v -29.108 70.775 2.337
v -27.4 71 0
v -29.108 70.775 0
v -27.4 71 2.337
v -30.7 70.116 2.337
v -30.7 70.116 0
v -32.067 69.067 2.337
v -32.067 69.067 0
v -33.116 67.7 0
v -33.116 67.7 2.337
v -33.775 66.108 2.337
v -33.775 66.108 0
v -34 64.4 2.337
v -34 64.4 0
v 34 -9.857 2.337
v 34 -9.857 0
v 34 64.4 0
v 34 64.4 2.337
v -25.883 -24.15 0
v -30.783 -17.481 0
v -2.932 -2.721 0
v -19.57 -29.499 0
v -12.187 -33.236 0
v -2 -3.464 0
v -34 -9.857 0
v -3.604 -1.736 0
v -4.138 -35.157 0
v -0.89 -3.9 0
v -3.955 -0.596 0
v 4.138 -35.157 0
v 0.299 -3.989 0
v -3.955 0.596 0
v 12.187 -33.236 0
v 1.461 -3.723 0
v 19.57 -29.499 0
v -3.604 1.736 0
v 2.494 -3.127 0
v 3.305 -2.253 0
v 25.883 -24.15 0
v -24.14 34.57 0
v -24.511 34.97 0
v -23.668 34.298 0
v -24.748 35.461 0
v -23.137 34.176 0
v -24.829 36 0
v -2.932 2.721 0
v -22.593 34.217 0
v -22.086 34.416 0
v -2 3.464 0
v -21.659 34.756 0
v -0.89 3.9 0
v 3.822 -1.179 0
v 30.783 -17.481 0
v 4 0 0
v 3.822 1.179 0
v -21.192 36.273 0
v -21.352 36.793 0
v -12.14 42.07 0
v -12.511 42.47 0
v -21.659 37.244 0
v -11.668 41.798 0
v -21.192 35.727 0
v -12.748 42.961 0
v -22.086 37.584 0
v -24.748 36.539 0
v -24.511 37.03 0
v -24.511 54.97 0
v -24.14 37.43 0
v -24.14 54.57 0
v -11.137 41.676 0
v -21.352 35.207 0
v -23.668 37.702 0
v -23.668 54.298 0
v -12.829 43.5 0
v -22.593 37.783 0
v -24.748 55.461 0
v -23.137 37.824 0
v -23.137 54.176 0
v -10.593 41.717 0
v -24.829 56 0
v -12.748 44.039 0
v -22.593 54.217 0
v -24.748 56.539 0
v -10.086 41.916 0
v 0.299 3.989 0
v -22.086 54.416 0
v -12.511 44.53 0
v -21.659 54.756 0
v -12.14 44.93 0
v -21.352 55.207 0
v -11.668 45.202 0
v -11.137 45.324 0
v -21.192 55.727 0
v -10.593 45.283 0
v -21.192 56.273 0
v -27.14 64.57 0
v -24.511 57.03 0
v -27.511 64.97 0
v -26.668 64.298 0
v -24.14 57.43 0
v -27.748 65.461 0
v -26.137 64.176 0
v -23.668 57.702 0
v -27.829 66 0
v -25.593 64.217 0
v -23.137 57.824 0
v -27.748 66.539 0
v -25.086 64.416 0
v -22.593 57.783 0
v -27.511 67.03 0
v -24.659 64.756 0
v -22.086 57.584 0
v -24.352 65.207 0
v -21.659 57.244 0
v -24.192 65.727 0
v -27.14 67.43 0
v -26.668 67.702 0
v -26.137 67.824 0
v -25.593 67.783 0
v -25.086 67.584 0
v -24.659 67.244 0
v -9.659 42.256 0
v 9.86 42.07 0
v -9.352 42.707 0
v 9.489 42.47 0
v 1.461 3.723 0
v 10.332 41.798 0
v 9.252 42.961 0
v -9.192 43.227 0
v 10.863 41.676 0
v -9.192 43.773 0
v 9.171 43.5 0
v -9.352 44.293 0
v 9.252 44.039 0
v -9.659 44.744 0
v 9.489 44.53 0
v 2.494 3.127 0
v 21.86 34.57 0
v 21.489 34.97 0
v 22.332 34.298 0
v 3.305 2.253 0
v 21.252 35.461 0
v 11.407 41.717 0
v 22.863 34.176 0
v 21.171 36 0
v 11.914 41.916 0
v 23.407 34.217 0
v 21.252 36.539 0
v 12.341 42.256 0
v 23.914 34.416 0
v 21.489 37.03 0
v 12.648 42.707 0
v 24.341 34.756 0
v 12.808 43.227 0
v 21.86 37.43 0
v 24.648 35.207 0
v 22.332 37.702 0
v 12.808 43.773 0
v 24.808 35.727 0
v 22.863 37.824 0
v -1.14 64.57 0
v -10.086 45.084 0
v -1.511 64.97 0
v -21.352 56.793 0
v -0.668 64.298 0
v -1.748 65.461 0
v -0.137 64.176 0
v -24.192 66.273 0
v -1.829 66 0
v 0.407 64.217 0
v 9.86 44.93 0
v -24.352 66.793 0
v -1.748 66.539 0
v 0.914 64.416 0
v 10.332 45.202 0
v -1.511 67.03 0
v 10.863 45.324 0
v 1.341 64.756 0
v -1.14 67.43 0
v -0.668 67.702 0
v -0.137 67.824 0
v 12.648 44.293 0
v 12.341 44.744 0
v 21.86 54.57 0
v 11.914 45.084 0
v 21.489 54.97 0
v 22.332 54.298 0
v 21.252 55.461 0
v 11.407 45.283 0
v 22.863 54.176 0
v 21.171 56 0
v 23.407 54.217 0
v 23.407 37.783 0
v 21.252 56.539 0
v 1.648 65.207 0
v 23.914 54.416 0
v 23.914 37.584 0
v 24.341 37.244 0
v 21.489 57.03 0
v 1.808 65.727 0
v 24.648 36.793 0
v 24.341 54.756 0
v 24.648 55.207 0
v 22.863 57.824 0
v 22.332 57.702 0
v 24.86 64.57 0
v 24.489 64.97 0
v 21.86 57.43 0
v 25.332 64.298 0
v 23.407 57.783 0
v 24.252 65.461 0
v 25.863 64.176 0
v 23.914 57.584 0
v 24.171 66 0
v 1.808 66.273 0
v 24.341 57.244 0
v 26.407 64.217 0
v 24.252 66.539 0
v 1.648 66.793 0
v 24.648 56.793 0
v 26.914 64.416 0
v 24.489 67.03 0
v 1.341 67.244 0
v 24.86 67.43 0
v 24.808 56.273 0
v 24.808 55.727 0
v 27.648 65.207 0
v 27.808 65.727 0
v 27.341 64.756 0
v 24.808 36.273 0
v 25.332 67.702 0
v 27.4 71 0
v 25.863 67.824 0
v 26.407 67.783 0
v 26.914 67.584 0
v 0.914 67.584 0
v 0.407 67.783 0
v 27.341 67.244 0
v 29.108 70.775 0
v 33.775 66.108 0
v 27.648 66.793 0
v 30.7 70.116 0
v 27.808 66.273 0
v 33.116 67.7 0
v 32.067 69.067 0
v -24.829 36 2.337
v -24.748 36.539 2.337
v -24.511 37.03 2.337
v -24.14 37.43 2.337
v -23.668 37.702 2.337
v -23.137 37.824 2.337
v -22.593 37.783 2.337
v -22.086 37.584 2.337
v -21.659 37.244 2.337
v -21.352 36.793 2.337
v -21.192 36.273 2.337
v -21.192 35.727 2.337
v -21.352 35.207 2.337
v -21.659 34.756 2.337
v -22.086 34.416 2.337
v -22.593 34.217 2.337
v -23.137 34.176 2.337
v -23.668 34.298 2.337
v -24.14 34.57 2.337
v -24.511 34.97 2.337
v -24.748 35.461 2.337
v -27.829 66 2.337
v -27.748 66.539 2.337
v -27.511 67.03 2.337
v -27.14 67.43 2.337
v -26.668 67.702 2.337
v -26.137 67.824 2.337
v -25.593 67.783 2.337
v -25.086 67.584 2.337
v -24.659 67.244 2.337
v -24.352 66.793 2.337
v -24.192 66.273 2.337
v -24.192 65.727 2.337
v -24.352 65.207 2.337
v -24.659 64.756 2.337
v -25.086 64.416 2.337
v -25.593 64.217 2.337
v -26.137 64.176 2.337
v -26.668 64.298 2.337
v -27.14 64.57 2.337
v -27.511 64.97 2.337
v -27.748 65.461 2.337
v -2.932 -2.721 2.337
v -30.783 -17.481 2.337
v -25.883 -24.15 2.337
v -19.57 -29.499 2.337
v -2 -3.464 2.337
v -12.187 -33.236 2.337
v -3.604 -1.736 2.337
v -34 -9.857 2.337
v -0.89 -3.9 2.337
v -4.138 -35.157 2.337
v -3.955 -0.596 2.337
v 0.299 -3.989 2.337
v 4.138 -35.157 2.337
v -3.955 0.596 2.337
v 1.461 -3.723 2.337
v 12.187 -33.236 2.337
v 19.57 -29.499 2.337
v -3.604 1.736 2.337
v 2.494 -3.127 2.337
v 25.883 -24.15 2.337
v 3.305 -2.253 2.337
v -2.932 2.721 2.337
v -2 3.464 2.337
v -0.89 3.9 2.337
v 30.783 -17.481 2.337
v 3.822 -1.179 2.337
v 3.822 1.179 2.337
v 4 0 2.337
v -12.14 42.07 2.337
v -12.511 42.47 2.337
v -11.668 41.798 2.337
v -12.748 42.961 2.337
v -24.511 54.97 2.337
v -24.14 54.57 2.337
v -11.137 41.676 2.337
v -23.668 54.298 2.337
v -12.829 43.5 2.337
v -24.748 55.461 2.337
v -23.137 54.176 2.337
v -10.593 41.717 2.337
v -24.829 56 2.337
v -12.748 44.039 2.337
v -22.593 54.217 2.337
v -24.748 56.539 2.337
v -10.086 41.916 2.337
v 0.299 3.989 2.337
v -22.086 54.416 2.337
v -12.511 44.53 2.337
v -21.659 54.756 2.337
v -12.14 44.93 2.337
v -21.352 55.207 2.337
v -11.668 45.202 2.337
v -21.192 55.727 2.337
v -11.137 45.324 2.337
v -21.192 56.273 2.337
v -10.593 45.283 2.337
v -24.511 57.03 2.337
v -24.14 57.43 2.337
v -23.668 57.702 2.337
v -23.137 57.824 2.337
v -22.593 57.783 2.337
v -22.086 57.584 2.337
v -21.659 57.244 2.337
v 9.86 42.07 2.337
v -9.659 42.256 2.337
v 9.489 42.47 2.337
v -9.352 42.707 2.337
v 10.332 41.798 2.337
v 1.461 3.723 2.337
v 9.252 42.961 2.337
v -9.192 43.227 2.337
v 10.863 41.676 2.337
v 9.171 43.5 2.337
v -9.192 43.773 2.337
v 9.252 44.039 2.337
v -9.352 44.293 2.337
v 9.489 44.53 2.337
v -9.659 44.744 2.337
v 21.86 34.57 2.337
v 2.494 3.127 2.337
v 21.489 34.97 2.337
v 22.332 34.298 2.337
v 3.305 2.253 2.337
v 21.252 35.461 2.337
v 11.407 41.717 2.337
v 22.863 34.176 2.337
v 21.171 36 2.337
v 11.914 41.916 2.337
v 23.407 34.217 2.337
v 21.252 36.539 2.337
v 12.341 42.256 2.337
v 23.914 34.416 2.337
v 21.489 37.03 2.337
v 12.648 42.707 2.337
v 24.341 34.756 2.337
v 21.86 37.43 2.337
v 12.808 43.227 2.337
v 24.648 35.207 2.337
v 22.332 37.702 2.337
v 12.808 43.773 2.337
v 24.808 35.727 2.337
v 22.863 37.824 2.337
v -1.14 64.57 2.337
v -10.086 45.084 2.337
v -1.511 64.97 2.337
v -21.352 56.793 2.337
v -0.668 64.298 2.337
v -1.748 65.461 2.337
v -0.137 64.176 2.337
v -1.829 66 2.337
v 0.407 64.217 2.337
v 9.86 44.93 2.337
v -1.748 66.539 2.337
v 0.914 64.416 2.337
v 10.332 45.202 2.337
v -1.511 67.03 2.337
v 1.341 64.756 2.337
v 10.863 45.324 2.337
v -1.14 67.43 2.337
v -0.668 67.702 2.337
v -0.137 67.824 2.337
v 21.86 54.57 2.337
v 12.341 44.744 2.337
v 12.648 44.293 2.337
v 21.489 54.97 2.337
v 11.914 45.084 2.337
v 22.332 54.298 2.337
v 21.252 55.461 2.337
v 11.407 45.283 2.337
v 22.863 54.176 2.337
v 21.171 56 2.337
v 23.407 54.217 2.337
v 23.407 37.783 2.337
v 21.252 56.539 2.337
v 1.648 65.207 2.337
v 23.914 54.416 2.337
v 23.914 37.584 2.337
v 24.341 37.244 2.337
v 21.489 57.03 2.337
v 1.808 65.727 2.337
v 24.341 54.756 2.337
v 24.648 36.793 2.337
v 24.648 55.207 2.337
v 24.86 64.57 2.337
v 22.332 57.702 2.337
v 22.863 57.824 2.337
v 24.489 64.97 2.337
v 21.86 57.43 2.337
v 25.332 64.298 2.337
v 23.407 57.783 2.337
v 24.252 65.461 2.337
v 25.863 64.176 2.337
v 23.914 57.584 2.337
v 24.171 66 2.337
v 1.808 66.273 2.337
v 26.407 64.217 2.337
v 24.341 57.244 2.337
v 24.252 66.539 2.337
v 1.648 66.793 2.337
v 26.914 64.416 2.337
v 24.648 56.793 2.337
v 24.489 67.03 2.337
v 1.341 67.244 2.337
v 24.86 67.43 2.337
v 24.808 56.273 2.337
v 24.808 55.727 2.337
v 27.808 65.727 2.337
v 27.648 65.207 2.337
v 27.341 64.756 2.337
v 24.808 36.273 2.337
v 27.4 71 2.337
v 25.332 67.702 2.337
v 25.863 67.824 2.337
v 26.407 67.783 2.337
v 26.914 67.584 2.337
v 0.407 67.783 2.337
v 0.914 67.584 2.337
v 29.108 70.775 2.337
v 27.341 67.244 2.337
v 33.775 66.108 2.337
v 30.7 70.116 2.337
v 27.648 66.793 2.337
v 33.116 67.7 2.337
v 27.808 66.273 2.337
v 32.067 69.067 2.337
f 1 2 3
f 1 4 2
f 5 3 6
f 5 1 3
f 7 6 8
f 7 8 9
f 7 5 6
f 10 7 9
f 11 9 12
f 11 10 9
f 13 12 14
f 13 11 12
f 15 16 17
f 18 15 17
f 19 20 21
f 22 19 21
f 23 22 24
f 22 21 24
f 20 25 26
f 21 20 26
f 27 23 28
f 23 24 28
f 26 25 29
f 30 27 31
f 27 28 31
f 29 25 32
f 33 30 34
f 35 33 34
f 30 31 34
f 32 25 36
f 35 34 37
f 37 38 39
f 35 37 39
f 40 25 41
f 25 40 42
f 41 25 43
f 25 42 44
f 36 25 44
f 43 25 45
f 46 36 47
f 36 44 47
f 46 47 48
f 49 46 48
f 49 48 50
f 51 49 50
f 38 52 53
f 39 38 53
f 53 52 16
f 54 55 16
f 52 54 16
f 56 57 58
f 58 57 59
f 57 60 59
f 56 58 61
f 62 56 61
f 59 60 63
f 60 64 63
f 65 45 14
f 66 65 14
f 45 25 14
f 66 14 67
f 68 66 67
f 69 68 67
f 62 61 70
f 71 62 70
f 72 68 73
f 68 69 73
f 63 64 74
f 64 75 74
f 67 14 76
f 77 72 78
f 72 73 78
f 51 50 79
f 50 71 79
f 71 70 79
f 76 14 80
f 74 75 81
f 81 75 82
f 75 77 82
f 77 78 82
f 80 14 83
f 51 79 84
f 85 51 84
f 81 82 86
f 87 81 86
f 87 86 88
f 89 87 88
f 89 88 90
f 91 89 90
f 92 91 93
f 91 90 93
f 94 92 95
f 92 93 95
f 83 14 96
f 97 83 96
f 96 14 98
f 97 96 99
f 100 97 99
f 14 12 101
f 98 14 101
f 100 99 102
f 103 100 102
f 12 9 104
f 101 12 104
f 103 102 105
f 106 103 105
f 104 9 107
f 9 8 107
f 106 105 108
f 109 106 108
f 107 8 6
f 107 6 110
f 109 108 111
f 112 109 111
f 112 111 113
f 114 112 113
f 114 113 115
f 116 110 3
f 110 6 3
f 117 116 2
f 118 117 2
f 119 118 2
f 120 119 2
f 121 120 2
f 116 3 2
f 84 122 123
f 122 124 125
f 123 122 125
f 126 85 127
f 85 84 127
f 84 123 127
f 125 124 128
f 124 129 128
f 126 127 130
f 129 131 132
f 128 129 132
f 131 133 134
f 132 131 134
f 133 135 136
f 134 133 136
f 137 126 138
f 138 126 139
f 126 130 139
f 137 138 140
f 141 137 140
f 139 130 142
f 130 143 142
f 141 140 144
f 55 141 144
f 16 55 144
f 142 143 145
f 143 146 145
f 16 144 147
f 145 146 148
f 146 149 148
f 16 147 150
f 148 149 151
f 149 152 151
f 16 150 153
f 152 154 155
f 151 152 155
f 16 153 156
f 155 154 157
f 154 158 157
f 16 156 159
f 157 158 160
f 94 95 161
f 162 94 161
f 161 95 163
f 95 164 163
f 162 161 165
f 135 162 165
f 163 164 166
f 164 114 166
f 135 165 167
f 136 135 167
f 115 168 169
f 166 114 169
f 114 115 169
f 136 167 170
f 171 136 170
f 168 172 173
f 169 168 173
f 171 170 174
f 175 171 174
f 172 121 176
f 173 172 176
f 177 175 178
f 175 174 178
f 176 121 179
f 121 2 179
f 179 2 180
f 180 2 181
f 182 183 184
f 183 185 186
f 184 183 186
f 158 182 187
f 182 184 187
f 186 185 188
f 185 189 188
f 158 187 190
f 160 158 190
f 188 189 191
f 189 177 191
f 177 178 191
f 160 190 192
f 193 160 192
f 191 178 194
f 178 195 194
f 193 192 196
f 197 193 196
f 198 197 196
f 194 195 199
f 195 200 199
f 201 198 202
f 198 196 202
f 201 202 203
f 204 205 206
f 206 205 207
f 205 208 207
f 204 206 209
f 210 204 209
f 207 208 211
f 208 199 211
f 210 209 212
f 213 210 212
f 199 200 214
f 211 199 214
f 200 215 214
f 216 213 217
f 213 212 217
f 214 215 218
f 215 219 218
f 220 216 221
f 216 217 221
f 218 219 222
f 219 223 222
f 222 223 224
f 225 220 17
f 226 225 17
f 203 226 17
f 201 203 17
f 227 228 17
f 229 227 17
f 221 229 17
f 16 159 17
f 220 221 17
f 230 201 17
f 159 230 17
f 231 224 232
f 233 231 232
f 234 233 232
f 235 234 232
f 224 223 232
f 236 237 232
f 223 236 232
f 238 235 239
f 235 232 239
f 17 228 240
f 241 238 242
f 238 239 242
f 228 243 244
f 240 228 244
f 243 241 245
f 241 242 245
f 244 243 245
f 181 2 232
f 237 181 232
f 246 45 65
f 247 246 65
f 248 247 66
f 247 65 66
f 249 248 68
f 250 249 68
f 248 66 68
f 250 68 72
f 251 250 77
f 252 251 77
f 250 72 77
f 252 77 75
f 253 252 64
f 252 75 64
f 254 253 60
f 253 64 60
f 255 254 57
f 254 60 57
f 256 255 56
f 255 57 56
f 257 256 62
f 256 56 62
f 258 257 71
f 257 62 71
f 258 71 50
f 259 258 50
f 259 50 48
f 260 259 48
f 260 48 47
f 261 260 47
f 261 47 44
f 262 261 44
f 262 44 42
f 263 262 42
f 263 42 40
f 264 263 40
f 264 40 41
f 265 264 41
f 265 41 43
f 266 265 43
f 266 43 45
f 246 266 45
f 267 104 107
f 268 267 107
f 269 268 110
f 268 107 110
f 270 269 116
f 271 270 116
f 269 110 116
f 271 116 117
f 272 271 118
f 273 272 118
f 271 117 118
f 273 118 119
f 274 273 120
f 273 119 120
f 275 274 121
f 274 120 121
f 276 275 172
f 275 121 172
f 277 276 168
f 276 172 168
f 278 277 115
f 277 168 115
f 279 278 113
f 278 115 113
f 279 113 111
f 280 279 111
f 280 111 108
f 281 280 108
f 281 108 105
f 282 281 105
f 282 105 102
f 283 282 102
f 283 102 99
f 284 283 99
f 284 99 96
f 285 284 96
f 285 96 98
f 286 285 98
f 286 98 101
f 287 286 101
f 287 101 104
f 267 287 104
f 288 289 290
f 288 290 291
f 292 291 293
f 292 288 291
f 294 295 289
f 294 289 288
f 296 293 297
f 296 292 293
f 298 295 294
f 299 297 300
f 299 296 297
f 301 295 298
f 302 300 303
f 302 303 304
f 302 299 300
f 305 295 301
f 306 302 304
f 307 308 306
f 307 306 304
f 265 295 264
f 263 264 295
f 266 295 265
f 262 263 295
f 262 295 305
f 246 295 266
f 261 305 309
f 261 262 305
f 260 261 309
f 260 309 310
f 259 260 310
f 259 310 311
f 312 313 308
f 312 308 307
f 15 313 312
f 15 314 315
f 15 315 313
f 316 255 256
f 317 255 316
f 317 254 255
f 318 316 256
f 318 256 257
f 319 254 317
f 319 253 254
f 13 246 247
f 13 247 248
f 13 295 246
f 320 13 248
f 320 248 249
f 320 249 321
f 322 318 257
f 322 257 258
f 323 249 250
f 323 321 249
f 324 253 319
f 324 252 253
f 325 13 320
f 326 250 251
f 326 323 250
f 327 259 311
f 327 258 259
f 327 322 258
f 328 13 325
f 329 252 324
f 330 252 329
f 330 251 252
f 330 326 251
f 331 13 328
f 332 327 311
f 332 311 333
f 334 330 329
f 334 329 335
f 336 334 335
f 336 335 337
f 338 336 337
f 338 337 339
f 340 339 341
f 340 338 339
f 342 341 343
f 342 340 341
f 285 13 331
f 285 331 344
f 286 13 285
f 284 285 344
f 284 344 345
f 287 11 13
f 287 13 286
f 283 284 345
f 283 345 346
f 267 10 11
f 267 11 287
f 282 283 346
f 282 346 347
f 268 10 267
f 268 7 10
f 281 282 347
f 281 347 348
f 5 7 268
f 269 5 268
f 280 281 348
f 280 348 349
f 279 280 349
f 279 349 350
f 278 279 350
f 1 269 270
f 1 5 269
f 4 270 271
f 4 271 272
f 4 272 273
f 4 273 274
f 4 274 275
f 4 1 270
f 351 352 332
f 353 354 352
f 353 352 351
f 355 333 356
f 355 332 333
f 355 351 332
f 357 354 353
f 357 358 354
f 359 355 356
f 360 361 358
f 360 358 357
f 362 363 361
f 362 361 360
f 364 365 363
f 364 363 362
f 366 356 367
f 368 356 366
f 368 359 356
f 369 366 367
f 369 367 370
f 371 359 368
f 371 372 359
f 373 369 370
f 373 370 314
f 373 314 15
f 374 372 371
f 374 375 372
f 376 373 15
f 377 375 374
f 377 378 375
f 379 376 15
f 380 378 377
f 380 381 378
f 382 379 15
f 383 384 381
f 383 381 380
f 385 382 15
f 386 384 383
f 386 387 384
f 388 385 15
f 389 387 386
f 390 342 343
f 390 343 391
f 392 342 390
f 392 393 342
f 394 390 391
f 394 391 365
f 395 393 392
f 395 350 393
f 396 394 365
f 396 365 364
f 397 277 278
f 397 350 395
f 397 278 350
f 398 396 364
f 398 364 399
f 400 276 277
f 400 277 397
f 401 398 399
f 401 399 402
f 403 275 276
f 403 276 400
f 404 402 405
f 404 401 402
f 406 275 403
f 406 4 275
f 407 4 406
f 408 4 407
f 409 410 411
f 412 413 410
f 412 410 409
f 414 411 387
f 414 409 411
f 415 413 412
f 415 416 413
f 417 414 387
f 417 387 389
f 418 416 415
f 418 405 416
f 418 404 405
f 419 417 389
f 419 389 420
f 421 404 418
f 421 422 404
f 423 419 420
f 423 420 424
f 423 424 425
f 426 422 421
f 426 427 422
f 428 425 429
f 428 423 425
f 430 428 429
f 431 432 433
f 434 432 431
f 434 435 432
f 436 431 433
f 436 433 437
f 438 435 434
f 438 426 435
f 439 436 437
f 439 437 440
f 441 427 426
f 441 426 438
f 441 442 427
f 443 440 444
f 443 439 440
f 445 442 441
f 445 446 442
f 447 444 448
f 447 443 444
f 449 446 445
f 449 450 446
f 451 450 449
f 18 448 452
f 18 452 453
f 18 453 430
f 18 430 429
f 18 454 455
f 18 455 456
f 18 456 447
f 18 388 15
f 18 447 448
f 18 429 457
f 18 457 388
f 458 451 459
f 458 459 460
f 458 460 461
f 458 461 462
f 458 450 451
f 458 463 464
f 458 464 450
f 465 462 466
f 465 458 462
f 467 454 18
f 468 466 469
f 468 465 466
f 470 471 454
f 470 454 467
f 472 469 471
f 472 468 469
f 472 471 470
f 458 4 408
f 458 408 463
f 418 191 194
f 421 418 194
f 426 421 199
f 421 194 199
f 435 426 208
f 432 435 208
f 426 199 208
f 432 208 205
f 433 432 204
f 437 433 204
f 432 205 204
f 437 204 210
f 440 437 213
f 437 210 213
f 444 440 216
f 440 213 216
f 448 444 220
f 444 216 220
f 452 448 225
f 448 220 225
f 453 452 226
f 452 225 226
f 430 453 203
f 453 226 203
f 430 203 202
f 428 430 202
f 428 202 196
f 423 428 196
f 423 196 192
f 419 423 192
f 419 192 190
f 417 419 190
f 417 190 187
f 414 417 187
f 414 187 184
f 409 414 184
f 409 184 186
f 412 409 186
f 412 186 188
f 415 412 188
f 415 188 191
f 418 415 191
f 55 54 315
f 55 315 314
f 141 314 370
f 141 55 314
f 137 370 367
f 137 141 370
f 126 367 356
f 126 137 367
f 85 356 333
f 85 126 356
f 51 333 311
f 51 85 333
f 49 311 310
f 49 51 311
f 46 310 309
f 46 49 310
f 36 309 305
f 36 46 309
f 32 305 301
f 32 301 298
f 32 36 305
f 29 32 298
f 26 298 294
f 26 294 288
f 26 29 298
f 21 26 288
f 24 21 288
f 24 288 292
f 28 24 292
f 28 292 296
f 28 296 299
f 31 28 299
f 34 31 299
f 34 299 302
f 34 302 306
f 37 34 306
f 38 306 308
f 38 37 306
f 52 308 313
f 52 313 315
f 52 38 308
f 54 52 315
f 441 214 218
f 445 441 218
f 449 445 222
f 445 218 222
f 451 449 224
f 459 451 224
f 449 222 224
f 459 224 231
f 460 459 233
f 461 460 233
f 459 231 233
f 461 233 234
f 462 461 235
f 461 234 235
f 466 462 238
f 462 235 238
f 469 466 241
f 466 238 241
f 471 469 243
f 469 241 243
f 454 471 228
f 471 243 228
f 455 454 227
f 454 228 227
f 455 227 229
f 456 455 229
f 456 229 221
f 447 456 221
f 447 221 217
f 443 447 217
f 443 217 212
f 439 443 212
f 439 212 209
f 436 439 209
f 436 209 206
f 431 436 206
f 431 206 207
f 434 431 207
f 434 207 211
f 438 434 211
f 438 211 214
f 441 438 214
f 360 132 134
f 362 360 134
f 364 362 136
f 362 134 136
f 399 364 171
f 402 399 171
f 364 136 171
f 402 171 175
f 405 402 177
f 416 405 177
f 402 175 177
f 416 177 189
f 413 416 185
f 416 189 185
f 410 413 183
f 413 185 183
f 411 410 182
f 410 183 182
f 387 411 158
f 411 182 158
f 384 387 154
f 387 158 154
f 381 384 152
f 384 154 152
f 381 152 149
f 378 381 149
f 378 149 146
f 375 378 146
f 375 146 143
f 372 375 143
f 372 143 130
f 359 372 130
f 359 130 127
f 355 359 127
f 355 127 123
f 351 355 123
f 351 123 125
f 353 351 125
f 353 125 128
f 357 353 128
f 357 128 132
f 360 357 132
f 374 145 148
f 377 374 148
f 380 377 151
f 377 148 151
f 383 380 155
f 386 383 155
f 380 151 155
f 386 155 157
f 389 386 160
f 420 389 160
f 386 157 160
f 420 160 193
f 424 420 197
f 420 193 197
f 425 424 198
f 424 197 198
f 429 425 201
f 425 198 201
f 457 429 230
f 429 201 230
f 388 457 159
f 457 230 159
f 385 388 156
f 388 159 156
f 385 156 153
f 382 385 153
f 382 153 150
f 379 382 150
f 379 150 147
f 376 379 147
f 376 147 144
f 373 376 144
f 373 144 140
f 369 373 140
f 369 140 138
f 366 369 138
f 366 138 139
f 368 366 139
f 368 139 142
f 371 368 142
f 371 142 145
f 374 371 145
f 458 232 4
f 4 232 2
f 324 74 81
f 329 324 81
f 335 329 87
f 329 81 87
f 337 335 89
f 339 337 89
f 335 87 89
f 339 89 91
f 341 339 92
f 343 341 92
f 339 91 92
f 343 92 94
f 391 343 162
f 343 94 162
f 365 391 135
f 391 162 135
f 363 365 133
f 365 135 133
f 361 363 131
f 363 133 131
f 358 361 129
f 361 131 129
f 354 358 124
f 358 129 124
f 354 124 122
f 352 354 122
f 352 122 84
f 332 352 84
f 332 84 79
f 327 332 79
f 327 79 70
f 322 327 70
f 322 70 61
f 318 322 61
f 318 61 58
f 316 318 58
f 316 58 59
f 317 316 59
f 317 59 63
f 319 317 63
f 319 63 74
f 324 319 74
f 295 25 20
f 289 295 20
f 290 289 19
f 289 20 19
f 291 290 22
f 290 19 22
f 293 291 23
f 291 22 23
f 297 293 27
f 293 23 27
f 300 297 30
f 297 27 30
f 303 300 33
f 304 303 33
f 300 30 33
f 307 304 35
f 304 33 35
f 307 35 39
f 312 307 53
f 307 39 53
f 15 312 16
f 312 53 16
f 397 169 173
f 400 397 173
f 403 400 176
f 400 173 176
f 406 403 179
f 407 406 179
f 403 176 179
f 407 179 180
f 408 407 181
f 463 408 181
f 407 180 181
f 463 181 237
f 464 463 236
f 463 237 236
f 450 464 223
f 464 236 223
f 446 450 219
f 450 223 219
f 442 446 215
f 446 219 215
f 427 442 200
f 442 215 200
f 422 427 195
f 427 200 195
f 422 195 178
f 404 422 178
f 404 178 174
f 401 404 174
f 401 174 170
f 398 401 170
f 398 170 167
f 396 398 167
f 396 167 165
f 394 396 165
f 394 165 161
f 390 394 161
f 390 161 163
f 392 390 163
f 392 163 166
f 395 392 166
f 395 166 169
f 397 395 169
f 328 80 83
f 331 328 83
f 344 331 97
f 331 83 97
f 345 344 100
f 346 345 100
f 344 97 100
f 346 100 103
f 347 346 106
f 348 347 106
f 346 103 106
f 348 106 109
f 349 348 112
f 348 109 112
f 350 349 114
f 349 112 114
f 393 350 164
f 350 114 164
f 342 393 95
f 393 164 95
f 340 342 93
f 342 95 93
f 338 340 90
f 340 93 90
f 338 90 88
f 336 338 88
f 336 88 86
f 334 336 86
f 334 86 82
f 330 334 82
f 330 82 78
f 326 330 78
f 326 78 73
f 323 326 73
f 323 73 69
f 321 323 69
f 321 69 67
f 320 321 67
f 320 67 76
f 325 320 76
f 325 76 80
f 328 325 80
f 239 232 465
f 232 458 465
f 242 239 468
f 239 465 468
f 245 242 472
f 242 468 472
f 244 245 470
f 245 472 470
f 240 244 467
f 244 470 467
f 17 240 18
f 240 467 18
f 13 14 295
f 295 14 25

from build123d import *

# Parameters (mm, degrees)
SKETCH1_R             = 4
BOSS_EXTRUDE1_DEPTH   = 2.3368
F_6_CLEARANCE_HOLE1_D = 3.6576
FILLET1_R             = 6.6


with BuildPart() as part:
    # Sketch1 → Boss-Extrude1 (new body)
    with BuildSketch(Plane.XY):
        with BuildLine():
            Line((34, 71), (-34, 71))
            Line((-34, 71), (-34, -9.856977224))
            ThreePointArc((-34, -9.856977224), (0, -35.4), (34, -9.856977224))
            Line((34, -9.856977224), (34, 71))
        make_face()
        Circle(SKETCH1_R, mode=Mode.SUBTRACT)
    extrude(amount=BOSS_EXTRUDE1_DEPTH)

    # #6 Clearance Hole1 (through all)
    with Locations(Plane.XY.offset(2.3368)):
        with Locations((0, 66), (11, 43.5), (23, 36), (23, 56), (26, 66), (-23, 36), (-11, 43.5), (-23, 56), (-26, 66)):
            Hole(F_6_CLEARANCE_HOLE1_D / 2)

    # Fillet1
    fillet1_edges = [part.edges().sort_by_distance(p)[0] for p in [
        (-34, 71, 1.1684),
        (34, 71, 1.1684),
    ]]
    fillet(fillet1_edges, radius=FILLET1_R)


solid = part.part
